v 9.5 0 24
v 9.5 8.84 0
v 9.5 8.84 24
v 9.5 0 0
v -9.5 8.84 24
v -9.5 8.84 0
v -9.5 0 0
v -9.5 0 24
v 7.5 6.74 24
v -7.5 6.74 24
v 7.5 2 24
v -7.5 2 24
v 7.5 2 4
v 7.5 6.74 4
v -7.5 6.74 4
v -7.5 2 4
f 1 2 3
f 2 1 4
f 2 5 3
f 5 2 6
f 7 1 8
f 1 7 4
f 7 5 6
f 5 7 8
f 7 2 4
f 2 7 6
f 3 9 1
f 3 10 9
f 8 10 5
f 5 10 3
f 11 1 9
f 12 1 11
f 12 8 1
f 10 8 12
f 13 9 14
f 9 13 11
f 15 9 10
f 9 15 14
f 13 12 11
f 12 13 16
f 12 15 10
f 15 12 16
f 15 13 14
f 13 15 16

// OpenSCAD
//
//  WoodChistelBladeCover.scad
//
//  Evilteach  6/18/2016
//
//   
bladeWidth   = 15.00;
bladeDepth   = 20.00;
bladeHeight  =  4.84;

offset       =  2.00;
tighteness   =  0.10;

boxWidth  = bladeWidth + offset * 2;
boxDepth  = bladeDepth + offset * 2;
boxHeight = bladeHeight + offset * 2;

cutoutWidth  = boxWidth  - offset * 2;
cutoutDepth  = boxDepth  - offset * 2;
cutoutHeight = boxHeight - offset * 2;

module box()
{
    color("yellow")
        cube([boxWidth, boxDepth, boxHeight]);
}

module cutout()
{
    color("cyan")
        cube([cutoutWidth, cutoutDepth, cutoutHeight - tighteness]);
}


module main()
{
    translate([-boxWidth / 2, 0, boxDepth])
        rotate([270, 0, 0])
            difference()
            {
                box();
                
                translate([offset, 0, offset])
                    cutout();
            }
}


main();
